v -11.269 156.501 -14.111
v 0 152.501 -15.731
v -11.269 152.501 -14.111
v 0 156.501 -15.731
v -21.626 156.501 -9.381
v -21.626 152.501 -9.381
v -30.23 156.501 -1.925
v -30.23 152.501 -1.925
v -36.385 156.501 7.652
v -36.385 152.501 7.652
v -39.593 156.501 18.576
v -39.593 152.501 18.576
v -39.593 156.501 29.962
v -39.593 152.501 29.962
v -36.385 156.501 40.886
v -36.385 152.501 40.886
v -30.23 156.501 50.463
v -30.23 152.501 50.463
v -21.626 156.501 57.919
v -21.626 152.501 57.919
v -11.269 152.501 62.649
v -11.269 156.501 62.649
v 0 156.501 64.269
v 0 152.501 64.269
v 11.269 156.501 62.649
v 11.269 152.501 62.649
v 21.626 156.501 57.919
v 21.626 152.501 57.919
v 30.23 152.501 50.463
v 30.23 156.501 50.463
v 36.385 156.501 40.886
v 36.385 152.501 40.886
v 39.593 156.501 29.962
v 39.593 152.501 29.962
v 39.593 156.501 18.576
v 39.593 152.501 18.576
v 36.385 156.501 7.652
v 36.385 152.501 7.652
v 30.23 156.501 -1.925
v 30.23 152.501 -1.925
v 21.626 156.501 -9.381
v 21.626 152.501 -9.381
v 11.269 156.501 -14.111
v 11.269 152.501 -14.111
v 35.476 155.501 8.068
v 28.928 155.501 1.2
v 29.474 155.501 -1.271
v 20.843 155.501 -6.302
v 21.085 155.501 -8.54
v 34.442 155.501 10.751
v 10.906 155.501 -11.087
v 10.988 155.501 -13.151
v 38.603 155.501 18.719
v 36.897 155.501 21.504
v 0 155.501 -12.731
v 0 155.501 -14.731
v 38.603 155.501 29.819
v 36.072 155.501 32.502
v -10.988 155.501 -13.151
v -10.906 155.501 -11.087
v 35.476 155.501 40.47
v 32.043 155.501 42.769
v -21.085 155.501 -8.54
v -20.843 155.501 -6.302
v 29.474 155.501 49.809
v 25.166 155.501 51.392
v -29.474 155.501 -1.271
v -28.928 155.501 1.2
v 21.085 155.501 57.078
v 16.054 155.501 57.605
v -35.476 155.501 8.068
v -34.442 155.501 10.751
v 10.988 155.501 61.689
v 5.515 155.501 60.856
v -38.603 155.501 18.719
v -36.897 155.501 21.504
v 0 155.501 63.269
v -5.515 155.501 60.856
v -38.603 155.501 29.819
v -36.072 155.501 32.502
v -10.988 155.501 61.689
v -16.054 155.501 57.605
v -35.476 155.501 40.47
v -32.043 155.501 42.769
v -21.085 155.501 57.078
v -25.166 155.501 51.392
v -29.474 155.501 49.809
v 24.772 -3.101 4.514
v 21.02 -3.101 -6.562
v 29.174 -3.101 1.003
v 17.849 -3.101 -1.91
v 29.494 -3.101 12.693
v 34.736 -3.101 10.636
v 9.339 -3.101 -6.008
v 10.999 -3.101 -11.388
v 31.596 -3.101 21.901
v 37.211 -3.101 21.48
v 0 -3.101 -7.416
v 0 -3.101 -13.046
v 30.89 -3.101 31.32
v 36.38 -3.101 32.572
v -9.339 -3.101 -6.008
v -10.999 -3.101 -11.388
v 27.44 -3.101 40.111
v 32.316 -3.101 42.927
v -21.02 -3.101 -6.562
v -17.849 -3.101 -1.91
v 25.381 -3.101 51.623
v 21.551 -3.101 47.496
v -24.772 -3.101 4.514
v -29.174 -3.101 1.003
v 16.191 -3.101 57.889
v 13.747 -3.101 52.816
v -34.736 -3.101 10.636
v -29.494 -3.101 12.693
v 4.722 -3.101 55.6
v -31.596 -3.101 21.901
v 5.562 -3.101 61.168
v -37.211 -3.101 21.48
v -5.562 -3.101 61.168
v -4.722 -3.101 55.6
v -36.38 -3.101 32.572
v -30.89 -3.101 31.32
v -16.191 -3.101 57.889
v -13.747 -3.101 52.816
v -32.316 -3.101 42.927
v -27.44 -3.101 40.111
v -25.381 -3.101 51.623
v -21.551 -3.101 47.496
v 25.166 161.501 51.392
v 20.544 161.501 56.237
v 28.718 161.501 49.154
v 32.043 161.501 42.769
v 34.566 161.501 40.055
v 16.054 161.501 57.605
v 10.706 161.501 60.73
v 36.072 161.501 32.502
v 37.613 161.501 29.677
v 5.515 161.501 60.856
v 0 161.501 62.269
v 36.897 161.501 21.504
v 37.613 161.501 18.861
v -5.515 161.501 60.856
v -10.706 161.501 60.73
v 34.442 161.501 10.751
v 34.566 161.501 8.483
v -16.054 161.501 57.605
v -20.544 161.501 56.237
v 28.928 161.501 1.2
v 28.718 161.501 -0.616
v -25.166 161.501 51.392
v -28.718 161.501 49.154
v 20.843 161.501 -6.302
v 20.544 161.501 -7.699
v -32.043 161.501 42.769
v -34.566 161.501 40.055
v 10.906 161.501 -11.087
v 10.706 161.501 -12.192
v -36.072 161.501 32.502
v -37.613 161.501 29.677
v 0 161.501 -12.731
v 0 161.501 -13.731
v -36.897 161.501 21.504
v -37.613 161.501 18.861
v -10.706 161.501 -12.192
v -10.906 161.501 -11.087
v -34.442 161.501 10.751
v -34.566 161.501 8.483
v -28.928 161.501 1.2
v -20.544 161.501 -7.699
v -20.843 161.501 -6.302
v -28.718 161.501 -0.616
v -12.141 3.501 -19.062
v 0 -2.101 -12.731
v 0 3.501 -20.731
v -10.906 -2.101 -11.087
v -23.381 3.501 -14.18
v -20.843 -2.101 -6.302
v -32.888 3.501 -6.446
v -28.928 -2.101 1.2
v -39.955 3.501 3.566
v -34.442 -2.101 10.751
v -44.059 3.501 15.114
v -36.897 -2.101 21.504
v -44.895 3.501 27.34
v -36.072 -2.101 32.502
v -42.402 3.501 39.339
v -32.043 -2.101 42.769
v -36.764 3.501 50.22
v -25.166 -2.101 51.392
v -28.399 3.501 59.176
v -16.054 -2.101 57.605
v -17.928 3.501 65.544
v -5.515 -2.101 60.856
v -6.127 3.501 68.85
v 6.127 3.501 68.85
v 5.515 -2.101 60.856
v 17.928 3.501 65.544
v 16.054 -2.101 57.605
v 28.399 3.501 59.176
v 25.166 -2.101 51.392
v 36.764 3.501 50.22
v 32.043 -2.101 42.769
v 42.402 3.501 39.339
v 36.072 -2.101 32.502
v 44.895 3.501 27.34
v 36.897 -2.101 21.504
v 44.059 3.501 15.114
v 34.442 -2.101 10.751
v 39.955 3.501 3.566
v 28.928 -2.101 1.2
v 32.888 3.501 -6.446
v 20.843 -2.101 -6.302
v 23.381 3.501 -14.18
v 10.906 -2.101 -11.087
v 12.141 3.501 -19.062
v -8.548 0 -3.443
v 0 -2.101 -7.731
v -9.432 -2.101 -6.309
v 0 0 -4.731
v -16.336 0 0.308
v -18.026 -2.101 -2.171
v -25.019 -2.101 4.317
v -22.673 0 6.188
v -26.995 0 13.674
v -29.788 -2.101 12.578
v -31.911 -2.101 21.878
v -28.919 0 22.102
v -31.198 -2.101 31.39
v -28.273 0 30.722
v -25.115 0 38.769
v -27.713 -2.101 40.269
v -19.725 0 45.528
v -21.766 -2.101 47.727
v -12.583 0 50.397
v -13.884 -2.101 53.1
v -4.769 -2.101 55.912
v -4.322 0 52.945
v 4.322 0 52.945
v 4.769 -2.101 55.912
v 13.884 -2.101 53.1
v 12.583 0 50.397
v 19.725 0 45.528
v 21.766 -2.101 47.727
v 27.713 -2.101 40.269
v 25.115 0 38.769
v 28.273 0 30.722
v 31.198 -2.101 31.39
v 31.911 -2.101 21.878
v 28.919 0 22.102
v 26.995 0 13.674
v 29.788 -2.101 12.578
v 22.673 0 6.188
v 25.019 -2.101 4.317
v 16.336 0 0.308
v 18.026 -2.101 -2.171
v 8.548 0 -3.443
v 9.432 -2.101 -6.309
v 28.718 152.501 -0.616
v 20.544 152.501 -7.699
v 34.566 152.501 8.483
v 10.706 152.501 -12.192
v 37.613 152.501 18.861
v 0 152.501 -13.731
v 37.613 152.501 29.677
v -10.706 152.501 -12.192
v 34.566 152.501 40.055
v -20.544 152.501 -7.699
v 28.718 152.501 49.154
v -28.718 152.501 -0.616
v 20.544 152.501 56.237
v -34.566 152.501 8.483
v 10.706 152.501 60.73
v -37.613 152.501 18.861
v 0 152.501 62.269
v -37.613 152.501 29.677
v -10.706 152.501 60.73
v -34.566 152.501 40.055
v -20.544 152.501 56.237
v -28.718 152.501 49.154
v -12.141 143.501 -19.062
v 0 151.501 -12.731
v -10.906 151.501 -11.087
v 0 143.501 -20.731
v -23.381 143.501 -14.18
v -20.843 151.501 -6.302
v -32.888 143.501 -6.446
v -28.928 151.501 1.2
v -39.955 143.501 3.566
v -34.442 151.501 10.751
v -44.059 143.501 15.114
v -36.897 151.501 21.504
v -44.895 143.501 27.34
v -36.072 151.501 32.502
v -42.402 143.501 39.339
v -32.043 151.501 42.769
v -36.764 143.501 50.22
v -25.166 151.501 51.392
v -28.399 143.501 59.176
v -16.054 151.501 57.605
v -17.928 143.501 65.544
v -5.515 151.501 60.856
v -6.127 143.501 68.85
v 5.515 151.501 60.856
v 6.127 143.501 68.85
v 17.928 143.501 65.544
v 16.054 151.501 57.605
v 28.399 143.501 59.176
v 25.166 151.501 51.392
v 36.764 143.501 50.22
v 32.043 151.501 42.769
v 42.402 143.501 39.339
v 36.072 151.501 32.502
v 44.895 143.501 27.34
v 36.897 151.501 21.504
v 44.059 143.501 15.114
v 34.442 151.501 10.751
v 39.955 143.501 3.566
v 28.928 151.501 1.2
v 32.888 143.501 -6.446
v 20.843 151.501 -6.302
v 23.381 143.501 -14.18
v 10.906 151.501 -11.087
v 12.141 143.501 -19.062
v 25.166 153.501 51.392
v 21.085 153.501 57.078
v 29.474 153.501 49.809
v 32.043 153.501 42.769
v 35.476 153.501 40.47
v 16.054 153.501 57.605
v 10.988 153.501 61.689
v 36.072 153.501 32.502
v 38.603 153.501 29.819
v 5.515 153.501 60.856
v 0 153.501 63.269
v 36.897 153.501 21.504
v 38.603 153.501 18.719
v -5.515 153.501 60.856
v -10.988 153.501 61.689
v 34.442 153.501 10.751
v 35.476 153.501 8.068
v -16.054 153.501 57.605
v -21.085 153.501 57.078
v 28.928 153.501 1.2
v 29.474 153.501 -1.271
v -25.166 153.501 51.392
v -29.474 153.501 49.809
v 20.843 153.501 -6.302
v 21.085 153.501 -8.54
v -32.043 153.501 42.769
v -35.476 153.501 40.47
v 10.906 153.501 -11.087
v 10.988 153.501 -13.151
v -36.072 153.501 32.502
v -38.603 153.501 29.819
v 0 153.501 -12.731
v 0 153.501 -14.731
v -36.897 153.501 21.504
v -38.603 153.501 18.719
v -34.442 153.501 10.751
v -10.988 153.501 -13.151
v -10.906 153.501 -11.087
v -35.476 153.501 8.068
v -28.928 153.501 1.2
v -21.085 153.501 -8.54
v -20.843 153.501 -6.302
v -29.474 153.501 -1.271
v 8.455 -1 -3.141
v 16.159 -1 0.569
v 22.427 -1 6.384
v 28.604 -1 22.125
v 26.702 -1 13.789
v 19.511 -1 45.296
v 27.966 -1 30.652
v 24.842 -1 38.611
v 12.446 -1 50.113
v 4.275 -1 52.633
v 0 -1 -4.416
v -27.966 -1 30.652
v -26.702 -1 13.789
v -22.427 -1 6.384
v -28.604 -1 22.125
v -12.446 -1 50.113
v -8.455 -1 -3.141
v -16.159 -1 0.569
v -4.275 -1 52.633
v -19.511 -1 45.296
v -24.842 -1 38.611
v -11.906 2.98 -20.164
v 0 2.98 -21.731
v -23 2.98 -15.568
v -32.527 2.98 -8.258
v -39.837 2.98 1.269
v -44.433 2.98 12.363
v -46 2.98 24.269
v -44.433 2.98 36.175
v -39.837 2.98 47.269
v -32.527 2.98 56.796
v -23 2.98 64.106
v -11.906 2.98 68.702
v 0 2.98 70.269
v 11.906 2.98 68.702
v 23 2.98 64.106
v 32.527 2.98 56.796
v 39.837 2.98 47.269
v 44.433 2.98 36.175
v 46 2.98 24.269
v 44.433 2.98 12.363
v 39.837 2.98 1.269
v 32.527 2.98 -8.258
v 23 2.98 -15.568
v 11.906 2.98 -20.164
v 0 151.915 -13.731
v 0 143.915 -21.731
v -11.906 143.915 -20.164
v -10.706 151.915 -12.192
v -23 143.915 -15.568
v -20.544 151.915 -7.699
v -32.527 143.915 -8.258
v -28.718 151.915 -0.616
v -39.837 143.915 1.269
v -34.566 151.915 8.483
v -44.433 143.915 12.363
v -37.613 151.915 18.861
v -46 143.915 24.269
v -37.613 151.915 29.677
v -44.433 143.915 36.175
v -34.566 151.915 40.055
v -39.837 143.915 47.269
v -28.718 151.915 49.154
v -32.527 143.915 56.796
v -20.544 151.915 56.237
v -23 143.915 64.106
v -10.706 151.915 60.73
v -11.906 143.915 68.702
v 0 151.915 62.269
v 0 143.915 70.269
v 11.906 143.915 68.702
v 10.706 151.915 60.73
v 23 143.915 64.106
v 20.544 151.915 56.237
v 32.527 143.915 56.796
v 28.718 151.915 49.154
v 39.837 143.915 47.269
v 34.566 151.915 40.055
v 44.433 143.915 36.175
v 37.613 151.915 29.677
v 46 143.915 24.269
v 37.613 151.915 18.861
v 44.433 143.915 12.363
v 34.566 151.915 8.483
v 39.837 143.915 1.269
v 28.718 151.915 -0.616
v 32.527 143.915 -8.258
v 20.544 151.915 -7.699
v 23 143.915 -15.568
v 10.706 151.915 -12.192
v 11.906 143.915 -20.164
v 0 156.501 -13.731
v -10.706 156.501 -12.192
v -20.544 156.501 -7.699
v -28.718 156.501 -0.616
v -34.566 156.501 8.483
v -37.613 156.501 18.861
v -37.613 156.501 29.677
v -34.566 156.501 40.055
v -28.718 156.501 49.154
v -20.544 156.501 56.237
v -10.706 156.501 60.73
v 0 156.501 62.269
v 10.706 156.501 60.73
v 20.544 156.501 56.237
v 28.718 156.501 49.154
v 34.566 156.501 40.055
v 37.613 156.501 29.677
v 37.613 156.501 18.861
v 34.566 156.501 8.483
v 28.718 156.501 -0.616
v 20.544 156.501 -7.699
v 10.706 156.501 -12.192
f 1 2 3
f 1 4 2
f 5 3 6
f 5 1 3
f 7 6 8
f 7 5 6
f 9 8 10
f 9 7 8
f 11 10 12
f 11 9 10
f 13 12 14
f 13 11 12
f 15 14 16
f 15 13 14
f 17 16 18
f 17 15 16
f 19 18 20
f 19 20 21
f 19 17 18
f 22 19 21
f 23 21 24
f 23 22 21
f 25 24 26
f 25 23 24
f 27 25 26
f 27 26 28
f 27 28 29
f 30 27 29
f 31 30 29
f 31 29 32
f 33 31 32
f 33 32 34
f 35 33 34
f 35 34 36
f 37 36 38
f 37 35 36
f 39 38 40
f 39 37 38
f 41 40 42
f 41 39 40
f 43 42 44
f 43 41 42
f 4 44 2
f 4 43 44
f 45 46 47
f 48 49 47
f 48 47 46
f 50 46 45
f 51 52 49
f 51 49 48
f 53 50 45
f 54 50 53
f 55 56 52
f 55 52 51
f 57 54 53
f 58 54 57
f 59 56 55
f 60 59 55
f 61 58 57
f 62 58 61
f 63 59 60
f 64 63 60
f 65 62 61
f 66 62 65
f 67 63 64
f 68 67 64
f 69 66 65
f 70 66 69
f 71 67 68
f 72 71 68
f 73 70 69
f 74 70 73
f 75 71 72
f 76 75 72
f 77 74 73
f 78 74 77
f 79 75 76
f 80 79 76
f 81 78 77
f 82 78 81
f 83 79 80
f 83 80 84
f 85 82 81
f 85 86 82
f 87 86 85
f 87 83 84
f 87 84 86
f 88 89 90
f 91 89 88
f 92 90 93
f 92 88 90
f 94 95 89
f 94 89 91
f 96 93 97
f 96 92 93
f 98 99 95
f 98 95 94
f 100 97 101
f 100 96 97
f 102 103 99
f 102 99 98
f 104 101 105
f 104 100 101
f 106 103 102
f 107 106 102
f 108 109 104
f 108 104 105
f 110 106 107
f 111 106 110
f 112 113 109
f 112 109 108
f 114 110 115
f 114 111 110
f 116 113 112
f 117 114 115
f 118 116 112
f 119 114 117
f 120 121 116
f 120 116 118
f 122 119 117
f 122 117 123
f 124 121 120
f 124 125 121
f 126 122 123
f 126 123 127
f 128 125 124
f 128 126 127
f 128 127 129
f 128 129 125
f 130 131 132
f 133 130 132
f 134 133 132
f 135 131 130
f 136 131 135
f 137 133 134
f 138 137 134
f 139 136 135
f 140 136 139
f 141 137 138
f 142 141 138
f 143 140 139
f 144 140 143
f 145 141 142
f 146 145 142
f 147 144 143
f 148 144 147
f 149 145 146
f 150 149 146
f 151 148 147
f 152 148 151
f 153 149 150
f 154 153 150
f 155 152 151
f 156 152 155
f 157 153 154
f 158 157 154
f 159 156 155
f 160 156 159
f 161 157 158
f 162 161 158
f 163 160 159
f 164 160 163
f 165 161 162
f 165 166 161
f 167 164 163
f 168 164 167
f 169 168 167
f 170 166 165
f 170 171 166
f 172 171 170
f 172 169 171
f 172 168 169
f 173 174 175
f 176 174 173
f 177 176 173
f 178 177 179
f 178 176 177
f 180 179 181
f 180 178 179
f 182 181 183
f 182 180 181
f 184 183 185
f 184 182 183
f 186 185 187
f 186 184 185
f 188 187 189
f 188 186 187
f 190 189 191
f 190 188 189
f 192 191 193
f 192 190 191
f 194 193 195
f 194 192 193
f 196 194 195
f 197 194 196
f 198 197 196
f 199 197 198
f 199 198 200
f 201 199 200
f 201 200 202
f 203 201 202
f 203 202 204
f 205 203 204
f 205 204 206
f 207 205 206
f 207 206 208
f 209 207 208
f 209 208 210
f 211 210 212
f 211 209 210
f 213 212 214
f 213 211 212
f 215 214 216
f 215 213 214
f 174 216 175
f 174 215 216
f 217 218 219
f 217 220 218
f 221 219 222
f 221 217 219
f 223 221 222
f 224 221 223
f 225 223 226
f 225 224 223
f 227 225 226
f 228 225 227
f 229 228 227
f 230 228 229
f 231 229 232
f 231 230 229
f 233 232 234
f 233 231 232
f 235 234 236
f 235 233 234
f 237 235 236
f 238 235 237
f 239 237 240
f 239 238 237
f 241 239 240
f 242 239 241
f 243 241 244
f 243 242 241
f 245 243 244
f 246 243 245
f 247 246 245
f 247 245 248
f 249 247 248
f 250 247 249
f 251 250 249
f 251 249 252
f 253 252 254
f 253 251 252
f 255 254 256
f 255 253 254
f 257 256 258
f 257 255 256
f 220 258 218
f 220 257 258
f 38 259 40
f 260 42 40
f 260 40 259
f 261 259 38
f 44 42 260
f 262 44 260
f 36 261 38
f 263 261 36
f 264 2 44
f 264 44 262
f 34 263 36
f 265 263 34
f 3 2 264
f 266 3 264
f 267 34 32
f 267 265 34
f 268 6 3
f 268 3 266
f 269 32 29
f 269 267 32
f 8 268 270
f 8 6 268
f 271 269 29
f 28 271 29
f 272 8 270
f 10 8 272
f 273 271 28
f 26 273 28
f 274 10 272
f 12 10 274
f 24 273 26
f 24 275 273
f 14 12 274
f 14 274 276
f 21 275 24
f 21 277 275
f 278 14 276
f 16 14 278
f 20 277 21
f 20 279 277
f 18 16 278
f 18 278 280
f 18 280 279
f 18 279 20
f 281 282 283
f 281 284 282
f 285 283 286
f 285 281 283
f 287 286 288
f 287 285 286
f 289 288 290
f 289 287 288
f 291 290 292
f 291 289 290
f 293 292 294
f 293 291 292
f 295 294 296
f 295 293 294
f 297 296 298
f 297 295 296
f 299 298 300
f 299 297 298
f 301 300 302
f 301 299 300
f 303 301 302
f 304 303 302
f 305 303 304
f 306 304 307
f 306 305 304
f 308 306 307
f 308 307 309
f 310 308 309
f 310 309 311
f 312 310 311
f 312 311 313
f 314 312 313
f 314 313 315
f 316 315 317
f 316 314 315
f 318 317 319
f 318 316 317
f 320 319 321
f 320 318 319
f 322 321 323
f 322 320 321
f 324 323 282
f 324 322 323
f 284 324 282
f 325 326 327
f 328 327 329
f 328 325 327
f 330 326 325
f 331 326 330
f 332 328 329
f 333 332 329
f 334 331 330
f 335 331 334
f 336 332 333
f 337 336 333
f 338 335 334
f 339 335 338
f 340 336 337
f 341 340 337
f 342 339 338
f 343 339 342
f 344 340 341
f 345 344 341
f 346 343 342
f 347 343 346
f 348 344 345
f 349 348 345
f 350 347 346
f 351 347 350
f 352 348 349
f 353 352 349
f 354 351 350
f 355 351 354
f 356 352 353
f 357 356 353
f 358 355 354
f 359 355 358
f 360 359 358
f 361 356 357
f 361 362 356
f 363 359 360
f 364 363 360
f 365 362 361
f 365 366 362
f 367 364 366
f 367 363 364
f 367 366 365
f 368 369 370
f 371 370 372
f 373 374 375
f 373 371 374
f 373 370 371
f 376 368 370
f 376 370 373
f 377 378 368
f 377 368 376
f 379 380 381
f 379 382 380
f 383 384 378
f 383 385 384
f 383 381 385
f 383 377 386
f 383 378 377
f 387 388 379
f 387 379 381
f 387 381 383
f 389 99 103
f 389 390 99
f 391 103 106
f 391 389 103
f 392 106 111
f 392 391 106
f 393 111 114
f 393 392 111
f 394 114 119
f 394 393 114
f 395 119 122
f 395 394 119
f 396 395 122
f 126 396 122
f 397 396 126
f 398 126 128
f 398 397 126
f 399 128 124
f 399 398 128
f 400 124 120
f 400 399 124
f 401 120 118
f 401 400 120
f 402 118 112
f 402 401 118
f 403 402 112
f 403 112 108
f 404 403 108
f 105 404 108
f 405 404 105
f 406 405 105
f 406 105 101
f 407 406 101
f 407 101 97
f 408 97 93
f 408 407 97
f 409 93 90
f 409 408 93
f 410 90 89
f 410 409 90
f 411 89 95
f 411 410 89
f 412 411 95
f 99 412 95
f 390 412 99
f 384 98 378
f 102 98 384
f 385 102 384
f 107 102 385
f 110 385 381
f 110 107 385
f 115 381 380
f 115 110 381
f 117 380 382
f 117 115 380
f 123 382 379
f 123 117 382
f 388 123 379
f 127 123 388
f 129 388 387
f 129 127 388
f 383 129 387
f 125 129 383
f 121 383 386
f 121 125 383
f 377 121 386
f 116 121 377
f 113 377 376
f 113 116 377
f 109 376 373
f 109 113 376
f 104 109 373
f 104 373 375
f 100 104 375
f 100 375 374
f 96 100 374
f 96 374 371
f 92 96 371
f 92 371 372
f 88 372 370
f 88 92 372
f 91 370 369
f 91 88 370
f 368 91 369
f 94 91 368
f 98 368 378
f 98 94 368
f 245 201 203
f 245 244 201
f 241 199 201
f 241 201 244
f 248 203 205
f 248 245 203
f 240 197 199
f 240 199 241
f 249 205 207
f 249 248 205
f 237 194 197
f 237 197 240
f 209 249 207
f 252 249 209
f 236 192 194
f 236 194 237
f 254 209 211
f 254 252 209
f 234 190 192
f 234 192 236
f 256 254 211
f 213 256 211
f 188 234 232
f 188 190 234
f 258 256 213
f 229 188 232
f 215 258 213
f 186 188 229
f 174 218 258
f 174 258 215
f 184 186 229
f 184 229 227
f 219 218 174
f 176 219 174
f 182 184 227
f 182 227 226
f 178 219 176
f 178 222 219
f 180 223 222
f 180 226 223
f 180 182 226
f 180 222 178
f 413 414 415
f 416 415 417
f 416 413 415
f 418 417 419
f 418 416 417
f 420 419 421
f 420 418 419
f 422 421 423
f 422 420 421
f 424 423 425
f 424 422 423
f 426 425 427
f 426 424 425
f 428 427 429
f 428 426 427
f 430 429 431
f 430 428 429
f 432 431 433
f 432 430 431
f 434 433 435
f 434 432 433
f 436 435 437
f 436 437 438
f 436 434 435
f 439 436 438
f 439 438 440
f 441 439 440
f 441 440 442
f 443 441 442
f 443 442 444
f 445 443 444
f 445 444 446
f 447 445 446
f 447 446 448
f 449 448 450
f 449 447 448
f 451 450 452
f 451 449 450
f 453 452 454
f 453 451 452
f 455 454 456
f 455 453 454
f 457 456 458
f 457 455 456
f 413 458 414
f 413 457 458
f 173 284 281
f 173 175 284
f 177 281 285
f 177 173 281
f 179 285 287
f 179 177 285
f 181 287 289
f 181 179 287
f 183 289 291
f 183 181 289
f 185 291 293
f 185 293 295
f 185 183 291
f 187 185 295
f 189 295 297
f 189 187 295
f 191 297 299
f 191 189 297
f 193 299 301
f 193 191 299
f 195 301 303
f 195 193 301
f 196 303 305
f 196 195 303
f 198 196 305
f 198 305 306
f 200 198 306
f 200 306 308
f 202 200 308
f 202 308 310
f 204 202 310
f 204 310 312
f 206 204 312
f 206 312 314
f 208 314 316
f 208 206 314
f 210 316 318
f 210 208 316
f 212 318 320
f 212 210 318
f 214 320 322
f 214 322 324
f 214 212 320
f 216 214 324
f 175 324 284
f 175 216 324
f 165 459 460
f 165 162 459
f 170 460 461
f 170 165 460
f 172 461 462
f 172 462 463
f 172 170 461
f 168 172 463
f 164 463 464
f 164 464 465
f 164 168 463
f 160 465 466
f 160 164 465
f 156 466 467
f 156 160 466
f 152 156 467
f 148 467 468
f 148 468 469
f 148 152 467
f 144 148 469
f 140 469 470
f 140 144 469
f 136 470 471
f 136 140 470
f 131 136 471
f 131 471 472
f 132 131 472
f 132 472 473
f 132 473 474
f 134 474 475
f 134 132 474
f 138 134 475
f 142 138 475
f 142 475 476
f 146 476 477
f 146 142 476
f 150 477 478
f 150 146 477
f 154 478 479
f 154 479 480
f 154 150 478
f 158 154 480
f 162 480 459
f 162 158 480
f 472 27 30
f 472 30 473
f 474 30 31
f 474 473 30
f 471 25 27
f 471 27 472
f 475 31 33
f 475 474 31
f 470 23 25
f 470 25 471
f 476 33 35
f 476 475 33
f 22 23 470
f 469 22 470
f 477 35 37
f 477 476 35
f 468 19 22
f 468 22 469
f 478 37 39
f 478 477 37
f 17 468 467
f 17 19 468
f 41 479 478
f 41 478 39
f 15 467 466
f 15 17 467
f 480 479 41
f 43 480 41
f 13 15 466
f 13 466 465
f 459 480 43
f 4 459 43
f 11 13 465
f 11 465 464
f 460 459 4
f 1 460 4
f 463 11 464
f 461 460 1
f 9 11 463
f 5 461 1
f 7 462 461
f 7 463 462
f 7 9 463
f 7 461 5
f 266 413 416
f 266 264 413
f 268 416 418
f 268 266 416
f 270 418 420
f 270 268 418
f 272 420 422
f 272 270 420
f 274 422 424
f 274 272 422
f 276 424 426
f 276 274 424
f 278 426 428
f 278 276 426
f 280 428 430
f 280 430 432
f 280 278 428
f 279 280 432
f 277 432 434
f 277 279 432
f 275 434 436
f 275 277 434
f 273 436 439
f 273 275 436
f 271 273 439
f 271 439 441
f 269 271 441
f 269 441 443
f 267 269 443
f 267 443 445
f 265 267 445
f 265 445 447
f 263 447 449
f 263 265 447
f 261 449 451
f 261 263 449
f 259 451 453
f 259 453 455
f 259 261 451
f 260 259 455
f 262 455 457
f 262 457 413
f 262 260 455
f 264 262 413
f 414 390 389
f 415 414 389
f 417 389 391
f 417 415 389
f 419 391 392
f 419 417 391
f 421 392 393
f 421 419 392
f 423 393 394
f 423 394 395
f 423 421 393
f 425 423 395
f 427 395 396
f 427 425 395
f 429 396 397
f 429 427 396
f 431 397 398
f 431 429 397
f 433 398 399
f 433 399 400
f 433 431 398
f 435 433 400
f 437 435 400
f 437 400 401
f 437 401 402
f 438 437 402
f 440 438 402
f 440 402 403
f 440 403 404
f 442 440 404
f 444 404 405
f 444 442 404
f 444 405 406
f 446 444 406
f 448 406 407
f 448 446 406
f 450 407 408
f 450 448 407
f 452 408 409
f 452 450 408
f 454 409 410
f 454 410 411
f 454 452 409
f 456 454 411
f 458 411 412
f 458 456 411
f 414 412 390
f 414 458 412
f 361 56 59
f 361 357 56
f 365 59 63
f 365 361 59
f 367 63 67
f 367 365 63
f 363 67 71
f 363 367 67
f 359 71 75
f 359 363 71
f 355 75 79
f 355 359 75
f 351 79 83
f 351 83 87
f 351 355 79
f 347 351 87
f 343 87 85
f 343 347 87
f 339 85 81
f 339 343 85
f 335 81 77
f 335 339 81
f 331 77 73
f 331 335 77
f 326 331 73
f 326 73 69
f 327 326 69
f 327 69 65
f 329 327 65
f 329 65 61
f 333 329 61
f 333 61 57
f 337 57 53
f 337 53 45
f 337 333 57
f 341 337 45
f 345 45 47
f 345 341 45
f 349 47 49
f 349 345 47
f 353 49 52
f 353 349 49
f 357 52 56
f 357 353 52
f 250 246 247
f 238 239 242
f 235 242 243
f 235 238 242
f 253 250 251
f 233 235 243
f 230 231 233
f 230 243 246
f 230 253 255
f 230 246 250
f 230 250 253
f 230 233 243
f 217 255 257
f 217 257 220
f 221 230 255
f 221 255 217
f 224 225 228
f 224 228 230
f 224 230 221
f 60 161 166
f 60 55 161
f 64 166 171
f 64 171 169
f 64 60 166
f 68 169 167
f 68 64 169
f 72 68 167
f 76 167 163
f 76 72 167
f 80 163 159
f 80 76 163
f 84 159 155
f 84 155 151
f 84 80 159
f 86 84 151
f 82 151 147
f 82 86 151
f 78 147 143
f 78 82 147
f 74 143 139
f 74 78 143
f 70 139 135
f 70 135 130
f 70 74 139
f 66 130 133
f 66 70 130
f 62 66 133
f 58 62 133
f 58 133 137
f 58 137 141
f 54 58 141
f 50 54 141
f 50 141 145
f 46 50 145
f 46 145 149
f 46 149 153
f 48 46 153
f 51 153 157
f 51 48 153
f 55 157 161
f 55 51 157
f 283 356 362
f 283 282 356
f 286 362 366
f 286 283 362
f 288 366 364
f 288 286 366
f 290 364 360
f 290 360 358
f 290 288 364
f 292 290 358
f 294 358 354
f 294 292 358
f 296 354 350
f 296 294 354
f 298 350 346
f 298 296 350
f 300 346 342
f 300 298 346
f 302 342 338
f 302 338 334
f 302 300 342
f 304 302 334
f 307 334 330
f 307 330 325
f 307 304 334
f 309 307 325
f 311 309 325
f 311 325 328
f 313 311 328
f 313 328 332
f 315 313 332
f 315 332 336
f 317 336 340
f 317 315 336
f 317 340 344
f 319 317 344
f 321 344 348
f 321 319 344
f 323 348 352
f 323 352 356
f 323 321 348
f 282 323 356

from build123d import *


with BuildPart() as part:
    # Sketch1 → Revolve-Thin1 (revolve)
    with BuildSketch(Plane(origin=(-3.343067137, 93.173104477, 24.269036423), x_dir=(1, 0, 0), z_dir=(0, 0, 1)), mode=Mode.PRIVATE) as revolve_thin1_sk:
        Polygon((-33.656932863, 68.327933214), (-33.656932863, 62.327933214), (-35.656932863, 62.327933214), (-35.656932863, 60.327933214), (-33.656932863, 60.327933214), (-33.656932863, 58.327933214), (-41.656932863, 50.327933214), (-41.656932863, -89.672066786), (-33.656932863, -95.273727092), (-28.656932863, -95.273727092), (-25.656932863, -93.173104477), (3.343067137, -93.173104477), (3.343067137, -94.173104477), (-25.341634074, -94.173104477), (-28.341634074, -96.273727092), (-33.972231651, -96.273727092), (-42.656932863, -90.192633837), (-42.656932863, 50.742146776), (-34.656932863, 58.742146776), (-34.656932863, 59.327933214), (-36.656932863, 59.327933214), (-36.656932863, 63.327933214), (-34.656932863, 63.327933214), (-34.656932863, 68.327933214), align=None)
    revolve(revolve_thin1_sk.sketch.rotate(Axis((0, 0, 24.269036423), (0, 1, 0)), 270), axis=Axis((0, 0, 24.269036423), (0, 1, 0)))


solid = part.part
